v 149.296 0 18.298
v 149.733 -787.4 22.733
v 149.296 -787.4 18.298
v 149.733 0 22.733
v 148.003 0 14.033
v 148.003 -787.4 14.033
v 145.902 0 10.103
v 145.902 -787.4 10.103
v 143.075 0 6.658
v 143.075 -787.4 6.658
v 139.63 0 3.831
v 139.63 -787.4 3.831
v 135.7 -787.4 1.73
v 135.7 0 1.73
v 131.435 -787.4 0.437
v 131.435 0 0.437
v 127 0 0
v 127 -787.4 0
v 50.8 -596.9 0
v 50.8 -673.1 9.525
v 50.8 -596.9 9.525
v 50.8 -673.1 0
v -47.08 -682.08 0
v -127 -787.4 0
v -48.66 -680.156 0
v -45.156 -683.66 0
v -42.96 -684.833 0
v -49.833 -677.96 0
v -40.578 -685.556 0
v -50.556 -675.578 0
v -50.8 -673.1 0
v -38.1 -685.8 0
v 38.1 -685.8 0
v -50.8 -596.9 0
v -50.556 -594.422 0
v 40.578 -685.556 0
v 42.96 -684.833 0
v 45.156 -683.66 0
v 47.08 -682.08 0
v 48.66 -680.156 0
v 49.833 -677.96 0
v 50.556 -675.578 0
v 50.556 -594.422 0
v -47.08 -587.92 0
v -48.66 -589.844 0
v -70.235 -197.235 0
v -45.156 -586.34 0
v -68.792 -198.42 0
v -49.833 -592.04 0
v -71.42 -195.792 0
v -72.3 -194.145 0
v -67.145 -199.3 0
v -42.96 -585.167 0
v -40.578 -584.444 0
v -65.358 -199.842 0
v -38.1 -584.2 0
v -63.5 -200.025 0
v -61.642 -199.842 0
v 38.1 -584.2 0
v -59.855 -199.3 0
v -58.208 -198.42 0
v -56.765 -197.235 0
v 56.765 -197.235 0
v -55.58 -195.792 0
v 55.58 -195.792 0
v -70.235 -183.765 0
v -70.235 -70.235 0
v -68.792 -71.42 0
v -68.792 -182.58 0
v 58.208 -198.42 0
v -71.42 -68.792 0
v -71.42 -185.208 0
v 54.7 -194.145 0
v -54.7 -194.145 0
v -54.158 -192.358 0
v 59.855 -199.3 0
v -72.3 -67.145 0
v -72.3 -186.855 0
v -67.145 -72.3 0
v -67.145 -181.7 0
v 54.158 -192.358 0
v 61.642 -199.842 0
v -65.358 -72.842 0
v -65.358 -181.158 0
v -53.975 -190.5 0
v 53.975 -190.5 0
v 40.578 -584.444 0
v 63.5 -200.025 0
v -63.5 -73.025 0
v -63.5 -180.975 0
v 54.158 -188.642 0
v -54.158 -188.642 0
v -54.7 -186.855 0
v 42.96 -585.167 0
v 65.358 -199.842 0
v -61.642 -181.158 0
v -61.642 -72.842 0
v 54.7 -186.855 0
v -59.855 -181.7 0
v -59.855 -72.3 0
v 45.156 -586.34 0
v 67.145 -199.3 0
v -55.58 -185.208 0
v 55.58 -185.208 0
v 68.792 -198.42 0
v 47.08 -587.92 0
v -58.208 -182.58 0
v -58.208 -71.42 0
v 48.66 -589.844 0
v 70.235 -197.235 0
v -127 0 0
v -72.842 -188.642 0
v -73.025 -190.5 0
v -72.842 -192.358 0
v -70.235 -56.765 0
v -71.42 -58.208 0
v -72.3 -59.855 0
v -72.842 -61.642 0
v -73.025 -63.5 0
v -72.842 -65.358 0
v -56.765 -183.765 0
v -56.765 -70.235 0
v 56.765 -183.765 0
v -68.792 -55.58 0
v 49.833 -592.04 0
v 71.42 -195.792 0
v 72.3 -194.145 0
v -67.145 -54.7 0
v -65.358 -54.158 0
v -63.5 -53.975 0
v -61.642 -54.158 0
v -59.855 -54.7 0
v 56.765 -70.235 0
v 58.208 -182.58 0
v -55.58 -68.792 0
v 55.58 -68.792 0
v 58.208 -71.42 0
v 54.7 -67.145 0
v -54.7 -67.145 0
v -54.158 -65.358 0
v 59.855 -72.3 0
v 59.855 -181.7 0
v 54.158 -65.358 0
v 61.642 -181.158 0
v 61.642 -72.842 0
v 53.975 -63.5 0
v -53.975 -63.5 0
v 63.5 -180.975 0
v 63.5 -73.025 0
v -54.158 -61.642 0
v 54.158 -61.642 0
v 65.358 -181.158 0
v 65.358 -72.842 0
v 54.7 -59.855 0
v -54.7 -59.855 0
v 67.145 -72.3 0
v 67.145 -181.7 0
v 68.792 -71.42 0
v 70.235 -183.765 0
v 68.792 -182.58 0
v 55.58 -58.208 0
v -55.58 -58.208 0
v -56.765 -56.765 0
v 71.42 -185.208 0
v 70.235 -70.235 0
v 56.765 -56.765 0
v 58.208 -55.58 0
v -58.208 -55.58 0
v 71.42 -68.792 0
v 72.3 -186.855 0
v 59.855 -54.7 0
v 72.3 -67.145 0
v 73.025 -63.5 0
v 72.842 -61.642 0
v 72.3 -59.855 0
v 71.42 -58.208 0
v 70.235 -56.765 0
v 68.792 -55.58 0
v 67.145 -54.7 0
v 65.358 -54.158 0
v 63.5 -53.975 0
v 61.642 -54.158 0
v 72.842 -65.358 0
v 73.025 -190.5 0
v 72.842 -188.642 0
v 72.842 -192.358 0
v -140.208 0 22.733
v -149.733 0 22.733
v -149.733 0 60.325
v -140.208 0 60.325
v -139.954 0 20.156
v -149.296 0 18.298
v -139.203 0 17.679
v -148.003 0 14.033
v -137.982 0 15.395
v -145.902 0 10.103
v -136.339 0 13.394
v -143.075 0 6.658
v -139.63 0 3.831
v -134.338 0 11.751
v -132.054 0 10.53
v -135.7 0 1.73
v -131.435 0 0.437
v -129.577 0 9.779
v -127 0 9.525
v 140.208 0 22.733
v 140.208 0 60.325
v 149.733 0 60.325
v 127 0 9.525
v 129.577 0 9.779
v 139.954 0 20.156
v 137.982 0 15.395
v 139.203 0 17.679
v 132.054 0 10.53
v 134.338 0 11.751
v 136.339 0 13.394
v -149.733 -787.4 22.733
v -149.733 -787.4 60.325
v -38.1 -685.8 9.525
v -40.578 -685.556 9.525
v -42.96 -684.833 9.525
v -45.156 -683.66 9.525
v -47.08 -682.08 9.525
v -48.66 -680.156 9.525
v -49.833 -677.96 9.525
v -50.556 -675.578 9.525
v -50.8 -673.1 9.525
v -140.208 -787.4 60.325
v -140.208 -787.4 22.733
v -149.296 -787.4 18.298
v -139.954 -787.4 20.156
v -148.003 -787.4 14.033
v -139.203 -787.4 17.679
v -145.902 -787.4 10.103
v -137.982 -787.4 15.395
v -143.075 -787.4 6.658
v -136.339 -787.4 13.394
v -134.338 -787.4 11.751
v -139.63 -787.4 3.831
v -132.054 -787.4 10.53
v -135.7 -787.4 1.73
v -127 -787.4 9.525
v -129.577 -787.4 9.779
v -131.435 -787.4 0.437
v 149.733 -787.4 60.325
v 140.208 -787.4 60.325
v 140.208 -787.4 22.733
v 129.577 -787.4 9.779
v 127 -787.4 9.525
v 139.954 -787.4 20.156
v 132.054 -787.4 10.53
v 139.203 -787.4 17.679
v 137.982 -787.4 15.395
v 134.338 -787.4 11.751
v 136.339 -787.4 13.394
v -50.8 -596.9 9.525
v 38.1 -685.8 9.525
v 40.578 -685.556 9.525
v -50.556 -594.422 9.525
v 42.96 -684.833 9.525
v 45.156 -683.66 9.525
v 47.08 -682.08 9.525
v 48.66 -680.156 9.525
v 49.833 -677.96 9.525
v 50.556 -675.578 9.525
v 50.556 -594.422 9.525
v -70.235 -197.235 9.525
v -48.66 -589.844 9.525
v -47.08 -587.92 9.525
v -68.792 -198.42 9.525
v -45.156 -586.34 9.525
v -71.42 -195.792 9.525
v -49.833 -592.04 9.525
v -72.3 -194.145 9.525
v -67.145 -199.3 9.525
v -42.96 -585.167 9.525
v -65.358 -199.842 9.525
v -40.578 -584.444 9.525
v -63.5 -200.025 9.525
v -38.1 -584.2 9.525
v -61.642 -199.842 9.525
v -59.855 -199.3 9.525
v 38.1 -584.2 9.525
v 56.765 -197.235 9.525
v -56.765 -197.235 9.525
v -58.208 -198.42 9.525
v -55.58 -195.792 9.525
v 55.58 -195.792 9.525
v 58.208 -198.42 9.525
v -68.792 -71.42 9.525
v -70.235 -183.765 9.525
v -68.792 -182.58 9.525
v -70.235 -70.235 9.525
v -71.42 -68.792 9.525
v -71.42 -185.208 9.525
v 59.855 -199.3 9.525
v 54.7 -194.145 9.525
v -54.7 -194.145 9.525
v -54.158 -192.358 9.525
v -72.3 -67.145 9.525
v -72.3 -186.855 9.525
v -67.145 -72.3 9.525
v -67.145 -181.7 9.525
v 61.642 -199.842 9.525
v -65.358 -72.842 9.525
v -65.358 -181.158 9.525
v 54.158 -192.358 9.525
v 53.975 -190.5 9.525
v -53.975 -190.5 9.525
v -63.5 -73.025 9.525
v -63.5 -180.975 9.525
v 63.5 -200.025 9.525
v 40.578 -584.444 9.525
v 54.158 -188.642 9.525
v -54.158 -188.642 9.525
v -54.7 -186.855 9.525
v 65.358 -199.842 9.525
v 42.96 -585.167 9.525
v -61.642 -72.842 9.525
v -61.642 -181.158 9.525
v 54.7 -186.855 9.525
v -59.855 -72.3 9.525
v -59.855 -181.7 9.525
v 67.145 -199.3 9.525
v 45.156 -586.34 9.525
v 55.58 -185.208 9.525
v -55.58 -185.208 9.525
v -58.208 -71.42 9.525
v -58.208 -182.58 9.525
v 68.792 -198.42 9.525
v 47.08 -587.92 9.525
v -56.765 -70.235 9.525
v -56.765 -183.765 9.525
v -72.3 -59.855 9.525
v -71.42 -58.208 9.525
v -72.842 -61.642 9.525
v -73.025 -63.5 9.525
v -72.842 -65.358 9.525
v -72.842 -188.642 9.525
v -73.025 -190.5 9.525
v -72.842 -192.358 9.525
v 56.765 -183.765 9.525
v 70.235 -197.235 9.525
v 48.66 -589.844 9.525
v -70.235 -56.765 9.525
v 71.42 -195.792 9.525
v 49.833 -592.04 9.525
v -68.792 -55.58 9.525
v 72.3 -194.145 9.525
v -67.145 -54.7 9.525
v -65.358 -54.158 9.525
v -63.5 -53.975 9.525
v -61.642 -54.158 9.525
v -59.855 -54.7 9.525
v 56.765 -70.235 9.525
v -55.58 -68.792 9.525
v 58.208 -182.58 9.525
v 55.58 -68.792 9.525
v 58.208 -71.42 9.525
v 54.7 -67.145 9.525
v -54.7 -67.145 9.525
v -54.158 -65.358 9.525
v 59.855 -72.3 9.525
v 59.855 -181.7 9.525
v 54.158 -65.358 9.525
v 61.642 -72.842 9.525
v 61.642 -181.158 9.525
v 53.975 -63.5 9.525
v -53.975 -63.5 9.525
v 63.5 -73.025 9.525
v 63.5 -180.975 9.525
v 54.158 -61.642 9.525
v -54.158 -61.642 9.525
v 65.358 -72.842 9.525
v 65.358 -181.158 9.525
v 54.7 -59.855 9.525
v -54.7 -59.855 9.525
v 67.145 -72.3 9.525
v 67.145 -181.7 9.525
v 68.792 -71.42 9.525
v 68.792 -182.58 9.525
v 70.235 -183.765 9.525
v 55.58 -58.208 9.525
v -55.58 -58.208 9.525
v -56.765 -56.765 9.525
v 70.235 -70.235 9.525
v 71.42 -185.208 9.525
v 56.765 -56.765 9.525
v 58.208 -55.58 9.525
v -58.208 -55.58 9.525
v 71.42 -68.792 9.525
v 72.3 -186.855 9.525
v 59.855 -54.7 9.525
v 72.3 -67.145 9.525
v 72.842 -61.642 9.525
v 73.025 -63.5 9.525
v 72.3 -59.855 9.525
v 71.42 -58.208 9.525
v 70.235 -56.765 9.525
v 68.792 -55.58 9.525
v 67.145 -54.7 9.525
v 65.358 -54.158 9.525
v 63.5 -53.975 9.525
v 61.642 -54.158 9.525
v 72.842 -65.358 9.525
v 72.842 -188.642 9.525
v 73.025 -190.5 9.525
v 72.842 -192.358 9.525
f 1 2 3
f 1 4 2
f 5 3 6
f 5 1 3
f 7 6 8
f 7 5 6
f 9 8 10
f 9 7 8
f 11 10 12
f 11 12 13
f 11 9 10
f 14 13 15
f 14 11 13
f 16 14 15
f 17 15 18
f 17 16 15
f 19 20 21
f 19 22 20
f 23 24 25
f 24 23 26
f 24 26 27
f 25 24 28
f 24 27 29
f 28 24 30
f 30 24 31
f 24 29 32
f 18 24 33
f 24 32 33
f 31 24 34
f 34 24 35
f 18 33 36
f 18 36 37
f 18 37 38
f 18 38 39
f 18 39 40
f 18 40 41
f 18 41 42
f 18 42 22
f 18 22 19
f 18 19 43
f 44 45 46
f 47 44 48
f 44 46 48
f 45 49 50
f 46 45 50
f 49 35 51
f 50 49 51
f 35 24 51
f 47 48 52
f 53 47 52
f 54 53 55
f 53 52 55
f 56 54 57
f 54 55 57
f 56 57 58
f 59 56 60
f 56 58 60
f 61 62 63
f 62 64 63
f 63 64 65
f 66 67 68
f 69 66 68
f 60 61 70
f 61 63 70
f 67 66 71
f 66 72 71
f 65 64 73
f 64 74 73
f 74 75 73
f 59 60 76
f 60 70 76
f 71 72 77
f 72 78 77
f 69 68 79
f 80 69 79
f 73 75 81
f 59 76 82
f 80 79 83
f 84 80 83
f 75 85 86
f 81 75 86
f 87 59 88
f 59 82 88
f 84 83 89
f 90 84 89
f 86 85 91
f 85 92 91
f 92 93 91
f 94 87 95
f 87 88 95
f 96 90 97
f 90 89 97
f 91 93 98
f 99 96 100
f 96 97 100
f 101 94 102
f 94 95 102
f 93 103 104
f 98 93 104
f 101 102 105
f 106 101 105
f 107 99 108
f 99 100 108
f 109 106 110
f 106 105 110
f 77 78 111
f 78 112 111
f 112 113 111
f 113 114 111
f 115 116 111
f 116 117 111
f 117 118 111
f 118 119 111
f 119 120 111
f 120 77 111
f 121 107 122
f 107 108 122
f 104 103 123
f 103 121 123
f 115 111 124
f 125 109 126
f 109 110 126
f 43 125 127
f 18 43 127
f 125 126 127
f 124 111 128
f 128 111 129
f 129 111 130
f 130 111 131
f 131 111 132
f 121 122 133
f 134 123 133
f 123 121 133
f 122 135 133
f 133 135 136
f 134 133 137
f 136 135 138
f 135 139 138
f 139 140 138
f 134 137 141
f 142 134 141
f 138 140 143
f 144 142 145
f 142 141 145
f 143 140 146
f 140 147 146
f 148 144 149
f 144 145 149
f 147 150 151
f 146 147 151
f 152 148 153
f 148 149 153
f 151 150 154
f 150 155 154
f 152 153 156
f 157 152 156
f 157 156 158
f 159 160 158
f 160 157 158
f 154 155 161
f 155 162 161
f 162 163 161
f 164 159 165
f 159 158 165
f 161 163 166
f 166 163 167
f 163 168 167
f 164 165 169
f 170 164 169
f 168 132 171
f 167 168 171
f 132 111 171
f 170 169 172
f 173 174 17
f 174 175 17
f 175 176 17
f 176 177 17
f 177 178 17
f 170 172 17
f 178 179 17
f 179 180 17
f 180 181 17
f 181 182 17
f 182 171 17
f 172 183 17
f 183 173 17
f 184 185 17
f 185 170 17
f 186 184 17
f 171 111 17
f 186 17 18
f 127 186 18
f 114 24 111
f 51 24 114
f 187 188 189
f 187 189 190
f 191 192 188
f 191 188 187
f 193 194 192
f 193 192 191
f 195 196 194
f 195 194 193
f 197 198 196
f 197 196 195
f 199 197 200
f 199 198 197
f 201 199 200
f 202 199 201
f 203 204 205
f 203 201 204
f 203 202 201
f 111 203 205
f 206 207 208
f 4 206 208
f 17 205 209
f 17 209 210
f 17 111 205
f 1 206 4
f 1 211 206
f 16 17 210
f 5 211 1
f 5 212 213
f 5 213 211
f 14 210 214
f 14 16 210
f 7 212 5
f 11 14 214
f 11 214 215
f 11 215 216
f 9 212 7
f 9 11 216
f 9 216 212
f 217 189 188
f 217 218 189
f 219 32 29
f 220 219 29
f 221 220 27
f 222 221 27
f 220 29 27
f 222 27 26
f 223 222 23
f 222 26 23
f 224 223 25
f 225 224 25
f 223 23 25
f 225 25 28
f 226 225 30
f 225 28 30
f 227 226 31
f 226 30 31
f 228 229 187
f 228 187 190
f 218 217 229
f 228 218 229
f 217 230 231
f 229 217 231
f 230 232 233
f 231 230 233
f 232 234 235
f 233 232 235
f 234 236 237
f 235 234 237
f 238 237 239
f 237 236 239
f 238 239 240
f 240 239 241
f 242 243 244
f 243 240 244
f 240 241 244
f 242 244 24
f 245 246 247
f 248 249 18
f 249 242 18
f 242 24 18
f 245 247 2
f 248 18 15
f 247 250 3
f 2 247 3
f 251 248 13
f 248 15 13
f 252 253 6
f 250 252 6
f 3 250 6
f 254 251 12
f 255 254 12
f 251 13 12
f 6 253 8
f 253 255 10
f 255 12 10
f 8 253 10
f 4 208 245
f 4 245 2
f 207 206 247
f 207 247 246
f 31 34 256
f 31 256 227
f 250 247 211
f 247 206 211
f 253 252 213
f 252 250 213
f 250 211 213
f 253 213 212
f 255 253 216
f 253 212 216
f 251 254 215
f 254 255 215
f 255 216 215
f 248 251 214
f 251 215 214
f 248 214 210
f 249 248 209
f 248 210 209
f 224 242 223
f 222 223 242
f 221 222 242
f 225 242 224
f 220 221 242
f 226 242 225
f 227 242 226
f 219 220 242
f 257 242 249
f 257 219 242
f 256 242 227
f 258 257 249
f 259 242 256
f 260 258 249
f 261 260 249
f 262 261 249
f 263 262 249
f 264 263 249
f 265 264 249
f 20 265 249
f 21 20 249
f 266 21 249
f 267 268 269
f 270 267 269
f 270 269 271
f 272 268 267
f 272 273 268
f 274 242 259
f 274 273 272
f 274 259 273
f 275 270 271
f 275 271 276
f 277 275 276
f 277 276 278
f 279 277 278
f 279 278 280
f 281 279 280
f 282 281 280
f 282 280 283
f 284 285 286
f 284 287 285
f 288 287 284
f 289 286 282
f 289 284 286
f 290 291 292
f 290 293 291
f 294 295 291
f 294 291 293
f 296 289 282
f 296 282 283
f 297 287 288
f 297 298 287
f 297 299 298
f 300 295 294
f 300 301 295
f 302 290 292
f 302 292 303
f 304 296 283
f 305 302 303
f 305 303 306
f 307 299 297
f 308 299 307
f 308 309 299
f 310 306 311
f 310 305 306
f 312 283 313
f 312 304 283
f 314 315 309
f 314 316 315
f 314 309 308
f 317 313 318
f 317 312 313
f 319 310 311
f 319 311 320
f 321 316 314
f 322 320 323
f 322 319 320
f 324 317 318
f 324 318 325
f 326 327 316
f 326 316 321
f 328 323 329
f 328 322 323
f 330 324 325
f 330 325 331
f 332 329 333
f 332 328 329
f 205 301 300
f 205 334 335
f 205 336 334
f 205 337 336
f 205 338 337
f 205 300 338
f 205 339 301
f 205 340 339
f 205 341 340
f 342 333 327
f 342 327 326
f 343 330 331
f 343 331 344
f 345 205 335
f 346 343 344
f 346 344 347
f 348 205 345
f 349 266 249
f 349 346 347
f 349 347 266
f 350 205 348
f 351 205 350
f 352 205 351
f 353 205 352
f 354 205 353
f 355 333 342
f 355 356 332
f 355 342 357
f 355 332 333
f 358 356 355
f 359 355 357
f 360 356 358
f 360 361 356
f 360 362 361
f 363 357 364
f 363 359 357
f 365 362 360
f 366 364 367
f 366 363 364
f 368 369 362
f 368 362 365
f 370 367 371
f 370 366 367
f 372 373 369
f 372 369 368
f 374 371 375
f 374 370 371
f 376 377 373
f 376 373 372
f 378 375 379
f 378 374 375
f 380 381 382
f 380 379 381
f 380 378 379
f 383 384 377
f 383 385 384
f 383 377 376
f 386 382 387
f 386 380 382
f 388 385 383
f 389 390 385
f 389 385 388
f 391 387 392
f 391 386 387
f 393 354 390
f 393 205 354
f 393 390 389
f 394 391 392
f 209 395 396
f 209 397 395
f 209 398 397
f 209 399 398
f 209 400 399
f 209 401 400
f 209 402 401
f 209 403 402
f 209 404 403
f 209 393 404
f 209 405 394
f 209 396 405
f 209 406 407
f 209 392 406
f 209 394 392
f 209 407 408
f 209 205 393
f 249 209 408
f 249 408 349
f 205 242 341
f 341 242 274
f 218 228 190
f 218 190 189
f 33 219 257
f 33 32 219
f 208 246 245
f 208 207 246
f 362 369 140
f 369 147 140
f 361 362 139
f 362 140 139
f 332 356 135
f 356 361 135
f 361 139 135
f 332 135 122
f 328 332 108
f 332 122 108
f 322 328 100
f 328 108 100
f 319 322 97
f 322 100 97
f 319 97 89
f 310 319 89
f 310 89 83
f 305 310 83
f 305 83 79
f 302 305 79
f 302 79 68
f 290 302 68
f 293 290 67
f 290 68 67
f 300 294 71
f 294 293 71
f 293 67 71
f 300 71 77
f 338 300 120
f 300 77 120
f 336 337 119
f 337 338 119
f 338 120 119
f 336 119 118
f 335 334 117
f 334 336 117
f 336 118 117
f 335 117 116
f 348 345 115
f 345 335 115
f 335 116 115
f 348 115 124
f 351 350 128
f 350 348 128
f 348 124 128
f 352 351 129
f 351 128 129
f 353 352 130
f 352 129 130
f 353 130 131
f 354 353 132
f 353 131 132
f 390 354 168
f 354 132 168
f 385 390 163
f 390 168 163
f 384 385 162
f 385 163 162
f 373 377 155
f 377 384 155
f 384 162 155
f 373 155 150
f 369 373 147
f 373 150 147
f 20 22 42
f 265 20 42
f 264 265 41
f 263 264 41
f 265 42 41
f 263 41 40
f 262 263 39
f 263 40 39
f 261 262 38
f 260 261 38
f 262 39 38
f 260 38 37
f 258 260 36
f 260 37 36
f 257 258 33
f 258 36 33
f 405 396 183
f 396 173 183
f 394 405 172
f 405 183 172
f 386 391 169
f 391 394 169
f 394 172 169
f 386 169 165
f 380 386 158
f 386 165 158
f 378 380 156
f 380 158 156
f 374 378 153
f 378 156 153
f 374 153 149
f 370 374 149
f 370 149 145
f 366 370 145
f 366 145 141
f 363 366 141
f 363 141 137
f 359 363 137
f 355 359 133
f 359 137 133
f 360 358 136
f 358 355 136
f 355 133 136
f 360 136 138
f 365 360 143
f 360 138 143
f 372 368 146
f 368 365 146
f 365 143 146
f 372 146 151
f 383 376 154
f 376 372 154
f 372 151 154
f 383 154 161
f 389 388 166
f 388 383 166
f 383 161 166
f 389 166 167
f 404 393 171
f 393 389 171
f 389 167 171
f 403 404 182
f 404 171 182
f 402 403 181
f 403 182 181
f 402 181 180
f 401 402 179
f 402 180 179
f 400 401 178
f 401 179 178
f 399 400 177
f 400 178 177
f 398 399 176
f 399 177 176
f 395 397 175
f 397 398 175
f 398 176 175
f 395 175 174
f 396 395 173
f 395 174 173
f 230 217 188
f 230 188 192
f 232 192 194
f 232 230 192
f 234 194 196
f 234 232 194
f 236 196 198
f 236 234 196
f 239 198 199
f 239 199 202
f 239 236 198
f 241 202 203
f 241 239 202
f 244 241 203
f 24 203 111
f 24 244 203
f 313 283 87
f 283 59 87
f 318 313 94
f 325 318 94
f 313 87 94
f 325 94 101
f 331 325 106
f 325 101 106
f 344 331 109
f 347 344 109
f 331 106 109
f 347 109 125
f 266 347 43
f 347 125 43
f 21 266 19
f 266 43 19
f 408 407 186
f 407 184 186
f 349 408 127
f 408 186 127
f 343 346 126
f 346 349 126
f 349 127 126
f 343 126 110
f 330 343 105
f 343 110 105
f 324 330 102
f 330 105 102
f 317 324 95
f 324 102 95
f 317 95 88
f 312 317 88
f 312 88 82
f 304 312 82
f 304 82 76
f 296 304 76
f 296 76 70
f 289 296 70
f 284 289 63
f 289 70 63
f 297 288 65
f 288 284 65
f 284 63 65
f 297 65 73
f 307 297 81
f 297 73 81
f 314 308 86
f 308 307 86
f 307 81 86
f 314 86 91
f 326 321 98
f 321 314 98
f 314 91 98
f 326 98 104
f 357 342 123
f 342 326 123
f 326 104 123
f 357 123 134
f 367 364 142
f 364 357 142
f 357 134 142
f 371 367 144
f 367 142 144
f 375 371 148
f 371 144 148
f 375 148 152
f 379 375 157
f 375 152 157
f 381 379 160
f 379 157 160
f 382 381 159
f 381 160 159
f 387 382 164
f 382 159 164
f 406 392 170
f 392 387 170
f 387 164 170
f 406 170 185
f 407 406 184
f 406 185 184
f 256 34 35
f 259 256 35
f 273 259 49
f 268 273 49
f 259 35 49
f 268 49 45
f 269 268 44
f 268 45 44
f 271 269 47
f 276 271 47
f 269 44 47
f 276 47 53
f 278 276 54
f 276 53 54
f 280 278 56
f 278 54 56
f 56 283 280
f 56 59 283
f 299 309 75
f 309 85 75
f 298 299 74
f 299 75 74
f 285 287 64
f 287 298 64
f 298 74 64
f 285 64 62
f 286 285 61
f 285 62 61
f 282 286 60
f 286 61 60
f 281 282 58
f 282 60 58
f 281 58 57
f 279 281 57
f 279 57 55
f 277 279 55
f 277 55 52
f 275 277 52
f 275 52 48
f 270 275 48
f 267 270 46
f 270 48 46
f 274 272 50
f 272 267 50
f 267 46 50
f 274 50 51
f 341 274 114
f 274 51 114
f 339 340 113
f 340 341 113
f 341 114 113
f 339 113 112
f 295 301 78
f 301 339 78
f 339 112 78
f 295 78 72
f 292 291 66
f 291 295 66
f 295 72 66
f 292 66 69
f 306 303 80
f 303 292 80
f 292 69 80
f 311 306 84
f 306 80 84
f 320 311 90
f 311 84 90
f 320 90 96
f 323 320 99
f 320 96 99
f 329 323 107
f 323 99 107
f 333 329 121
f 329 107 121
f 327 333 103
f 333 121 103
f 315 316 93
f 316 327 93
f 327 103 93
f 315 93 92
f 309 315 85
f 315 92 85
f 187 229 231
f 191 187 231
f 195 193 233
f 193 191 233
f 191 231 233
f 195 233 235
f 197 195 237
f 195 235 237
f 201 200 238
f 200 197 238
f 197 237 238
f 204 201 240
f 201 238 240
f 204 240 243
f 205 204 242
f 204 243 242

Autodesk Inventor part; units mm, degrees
ref_plane "YZ Plane" through (0, 0, 0) normal (1, 0, 0) x (0, 1, 0)
ref_plane "XZ Plane" through (0, 0, 0) normal (0, 1, 0) x (-1, 0, 0)
ref_plane "XY Plane" through (0, 0, 0) normal (0, 0, 1) x (1, 0, 0)
sketch "Sketch1" plane through (0, 0, 0) normal (0, 0, 1) x (1, 0, 0)
  line L0 (-127, 0) -> (127, 0)
  line L1 (-127, -787.4) -> (-127, 0)
  line L2 (127, 0) -> (127, -787.4)
  line L3 (-63.5, -190.5) -> (63.5, -190.5) construction
  line L4 (63.5, -190.5) -> (63.5, -63.5) construction
  line L5 (63.5, -63.5) -> (-63.5, -63.5) construction
  line L6 (-63.5, -63.5) -> (-63.5, -190.5) construction
  line L7 (-63.5, -190.5) -> (63.5, -63.5) construction
  line L8 (63.5, -190.5) -> (-63.5, -63.5) construction
  circle A0 centre (-63.5, -63.5) radius 9.525
  circle A1 centre (63.5, -63.5) radius 9.525
  circle A2 centre (63.5, -190.5) radius 9.525
  circle A3 centre (-63.5, -190.5) radius 9.525
  line L9 (-127, -787.4) -> (127, -787.4)
  point P0 (0, 0)
  point P1 (0, 0)
  point P2 (0, -127)
  point P3 (0, -63.5)
  dimension "d1" = 254
  dimension "d7" = 19.05
  dimension "d8" = 127
  dimension "d9" = 127
  dimension "d10" = 63.5
extrude "Plate1" add sketch "Sketch1" along normal blind 9.525
sketch "Sketch3" plane through (-140.208, -787.4, 22.733) normal (-1, 0, 0) x (0, -1, 0)
  line L0 (-787.4, 0) -> (0, 0)
  line L1 (0, 0) -> (0, 37.592)
  line L2 (0, 37.592) -> (-787.4, 37.592)
  line L3 (-787.4, 37.592) -> (-787.4, 0)
edge flange "Flange2" height 50.8 angle 90 thickness 9.525 bend radius 13.208 thickness toward (-1, 0, 0) relief tear relief width 9.525 relief depth 4.7625 corner gap 9.525 corner form 0 edges at (-127, -393.7, 9.525) (127, -393.7, 9.525) wall of the first edge with corners at (-140.208, 0, 22.733) (-140.208, -787.4, 22.733) (-140.208, -787.4, 60.325) (-140.208, 0, 60.325)
bend "Bend2"
corner "Corner2"
sketch "Sketch4" plane through (0, 0, 0) normal (0, 0, -1) x (-1, 0, 0)
  line L0 (-38.1, -584.2) -> (38.1, -584.2)
  line L1 (50.8, -596.9) -> (50.8, -673.1)
  line L2 (38.1, -685.8) -> (-38.1, -685.8)
  line L3 (-50.8, -673.1) -> (-50.8, -596.9)
  line L4 (-50.8, -584.2) -> (50.8, -685.8) construction
  line L5 (50.8, -584.2) -> (-50.8, -685.8) construction
  line L6 (127, -787.4) -> (-127, -787.4) projected
  line L7 (-127, 0) -> (127, 0) projected
  arc A0 (-38.1, -584.2) -> (-50.8, -596.9) centre (-38.1, -596.9) ccw
  arc A1 (50.8, -596.9) -> (38.1, -584.2) centre (38.1, -596.9) ccw
  arc A2 (38.1, -685.8) -> (50.8, -673.1) centre (38.1, -673.1) ccw
  arc A3 (-50.8, -673.1) -> (-38.1, -685.8) centre (-38.1, -673.1) ccw
  point P0 (0, 0)
  point P1 (0, -635)
  point P2 (0, 0)
  dimension "d40" = 101.6
  dimension "d41" = 101.6
  dimension "d42" = 101.6
  dimension "d43" = 12.7
extrude "Cut1" cut sketch "Sketch4" against normal blind 9.525
equation "\"d44\" = Thickness"
equation "\"d15\" = Thickness"
equation "\"d30\" = BendReliefWidth"
equation "\"d31\" = BendReliefDepth"
equation "\"d32\" = MinimumRemnant"
equation "\"d33\" = TransitionRadius"
equation "\"d36\" = BendRadius"
equation "\"d37\" = CornerReliefSize"
equation "\"d38\" = GapSize"
equation "\"d39\" = JacobiRadiusSize"
equation "\"BendReliefWidth\" = Thickness"
equation "\"BendReliefDepth\" = 0.5 * Thickness"
equation "\"CornerReliefSize\" = 4 * Thickness"
equation "\"MinimumRemnant\" = 2 * Thickness"
equation "\"TransitionRadius\" = BendRadius"
equation "\"JacobiRadiusSize\" = Thickness"
equation "\"GapSize\" = Thickness"
equation "\"Thickness\" = 9.525"
equation "\"BendRadius\" = 13.208"
properties part number "Model-5_Sheet-LH" material "SS304"
